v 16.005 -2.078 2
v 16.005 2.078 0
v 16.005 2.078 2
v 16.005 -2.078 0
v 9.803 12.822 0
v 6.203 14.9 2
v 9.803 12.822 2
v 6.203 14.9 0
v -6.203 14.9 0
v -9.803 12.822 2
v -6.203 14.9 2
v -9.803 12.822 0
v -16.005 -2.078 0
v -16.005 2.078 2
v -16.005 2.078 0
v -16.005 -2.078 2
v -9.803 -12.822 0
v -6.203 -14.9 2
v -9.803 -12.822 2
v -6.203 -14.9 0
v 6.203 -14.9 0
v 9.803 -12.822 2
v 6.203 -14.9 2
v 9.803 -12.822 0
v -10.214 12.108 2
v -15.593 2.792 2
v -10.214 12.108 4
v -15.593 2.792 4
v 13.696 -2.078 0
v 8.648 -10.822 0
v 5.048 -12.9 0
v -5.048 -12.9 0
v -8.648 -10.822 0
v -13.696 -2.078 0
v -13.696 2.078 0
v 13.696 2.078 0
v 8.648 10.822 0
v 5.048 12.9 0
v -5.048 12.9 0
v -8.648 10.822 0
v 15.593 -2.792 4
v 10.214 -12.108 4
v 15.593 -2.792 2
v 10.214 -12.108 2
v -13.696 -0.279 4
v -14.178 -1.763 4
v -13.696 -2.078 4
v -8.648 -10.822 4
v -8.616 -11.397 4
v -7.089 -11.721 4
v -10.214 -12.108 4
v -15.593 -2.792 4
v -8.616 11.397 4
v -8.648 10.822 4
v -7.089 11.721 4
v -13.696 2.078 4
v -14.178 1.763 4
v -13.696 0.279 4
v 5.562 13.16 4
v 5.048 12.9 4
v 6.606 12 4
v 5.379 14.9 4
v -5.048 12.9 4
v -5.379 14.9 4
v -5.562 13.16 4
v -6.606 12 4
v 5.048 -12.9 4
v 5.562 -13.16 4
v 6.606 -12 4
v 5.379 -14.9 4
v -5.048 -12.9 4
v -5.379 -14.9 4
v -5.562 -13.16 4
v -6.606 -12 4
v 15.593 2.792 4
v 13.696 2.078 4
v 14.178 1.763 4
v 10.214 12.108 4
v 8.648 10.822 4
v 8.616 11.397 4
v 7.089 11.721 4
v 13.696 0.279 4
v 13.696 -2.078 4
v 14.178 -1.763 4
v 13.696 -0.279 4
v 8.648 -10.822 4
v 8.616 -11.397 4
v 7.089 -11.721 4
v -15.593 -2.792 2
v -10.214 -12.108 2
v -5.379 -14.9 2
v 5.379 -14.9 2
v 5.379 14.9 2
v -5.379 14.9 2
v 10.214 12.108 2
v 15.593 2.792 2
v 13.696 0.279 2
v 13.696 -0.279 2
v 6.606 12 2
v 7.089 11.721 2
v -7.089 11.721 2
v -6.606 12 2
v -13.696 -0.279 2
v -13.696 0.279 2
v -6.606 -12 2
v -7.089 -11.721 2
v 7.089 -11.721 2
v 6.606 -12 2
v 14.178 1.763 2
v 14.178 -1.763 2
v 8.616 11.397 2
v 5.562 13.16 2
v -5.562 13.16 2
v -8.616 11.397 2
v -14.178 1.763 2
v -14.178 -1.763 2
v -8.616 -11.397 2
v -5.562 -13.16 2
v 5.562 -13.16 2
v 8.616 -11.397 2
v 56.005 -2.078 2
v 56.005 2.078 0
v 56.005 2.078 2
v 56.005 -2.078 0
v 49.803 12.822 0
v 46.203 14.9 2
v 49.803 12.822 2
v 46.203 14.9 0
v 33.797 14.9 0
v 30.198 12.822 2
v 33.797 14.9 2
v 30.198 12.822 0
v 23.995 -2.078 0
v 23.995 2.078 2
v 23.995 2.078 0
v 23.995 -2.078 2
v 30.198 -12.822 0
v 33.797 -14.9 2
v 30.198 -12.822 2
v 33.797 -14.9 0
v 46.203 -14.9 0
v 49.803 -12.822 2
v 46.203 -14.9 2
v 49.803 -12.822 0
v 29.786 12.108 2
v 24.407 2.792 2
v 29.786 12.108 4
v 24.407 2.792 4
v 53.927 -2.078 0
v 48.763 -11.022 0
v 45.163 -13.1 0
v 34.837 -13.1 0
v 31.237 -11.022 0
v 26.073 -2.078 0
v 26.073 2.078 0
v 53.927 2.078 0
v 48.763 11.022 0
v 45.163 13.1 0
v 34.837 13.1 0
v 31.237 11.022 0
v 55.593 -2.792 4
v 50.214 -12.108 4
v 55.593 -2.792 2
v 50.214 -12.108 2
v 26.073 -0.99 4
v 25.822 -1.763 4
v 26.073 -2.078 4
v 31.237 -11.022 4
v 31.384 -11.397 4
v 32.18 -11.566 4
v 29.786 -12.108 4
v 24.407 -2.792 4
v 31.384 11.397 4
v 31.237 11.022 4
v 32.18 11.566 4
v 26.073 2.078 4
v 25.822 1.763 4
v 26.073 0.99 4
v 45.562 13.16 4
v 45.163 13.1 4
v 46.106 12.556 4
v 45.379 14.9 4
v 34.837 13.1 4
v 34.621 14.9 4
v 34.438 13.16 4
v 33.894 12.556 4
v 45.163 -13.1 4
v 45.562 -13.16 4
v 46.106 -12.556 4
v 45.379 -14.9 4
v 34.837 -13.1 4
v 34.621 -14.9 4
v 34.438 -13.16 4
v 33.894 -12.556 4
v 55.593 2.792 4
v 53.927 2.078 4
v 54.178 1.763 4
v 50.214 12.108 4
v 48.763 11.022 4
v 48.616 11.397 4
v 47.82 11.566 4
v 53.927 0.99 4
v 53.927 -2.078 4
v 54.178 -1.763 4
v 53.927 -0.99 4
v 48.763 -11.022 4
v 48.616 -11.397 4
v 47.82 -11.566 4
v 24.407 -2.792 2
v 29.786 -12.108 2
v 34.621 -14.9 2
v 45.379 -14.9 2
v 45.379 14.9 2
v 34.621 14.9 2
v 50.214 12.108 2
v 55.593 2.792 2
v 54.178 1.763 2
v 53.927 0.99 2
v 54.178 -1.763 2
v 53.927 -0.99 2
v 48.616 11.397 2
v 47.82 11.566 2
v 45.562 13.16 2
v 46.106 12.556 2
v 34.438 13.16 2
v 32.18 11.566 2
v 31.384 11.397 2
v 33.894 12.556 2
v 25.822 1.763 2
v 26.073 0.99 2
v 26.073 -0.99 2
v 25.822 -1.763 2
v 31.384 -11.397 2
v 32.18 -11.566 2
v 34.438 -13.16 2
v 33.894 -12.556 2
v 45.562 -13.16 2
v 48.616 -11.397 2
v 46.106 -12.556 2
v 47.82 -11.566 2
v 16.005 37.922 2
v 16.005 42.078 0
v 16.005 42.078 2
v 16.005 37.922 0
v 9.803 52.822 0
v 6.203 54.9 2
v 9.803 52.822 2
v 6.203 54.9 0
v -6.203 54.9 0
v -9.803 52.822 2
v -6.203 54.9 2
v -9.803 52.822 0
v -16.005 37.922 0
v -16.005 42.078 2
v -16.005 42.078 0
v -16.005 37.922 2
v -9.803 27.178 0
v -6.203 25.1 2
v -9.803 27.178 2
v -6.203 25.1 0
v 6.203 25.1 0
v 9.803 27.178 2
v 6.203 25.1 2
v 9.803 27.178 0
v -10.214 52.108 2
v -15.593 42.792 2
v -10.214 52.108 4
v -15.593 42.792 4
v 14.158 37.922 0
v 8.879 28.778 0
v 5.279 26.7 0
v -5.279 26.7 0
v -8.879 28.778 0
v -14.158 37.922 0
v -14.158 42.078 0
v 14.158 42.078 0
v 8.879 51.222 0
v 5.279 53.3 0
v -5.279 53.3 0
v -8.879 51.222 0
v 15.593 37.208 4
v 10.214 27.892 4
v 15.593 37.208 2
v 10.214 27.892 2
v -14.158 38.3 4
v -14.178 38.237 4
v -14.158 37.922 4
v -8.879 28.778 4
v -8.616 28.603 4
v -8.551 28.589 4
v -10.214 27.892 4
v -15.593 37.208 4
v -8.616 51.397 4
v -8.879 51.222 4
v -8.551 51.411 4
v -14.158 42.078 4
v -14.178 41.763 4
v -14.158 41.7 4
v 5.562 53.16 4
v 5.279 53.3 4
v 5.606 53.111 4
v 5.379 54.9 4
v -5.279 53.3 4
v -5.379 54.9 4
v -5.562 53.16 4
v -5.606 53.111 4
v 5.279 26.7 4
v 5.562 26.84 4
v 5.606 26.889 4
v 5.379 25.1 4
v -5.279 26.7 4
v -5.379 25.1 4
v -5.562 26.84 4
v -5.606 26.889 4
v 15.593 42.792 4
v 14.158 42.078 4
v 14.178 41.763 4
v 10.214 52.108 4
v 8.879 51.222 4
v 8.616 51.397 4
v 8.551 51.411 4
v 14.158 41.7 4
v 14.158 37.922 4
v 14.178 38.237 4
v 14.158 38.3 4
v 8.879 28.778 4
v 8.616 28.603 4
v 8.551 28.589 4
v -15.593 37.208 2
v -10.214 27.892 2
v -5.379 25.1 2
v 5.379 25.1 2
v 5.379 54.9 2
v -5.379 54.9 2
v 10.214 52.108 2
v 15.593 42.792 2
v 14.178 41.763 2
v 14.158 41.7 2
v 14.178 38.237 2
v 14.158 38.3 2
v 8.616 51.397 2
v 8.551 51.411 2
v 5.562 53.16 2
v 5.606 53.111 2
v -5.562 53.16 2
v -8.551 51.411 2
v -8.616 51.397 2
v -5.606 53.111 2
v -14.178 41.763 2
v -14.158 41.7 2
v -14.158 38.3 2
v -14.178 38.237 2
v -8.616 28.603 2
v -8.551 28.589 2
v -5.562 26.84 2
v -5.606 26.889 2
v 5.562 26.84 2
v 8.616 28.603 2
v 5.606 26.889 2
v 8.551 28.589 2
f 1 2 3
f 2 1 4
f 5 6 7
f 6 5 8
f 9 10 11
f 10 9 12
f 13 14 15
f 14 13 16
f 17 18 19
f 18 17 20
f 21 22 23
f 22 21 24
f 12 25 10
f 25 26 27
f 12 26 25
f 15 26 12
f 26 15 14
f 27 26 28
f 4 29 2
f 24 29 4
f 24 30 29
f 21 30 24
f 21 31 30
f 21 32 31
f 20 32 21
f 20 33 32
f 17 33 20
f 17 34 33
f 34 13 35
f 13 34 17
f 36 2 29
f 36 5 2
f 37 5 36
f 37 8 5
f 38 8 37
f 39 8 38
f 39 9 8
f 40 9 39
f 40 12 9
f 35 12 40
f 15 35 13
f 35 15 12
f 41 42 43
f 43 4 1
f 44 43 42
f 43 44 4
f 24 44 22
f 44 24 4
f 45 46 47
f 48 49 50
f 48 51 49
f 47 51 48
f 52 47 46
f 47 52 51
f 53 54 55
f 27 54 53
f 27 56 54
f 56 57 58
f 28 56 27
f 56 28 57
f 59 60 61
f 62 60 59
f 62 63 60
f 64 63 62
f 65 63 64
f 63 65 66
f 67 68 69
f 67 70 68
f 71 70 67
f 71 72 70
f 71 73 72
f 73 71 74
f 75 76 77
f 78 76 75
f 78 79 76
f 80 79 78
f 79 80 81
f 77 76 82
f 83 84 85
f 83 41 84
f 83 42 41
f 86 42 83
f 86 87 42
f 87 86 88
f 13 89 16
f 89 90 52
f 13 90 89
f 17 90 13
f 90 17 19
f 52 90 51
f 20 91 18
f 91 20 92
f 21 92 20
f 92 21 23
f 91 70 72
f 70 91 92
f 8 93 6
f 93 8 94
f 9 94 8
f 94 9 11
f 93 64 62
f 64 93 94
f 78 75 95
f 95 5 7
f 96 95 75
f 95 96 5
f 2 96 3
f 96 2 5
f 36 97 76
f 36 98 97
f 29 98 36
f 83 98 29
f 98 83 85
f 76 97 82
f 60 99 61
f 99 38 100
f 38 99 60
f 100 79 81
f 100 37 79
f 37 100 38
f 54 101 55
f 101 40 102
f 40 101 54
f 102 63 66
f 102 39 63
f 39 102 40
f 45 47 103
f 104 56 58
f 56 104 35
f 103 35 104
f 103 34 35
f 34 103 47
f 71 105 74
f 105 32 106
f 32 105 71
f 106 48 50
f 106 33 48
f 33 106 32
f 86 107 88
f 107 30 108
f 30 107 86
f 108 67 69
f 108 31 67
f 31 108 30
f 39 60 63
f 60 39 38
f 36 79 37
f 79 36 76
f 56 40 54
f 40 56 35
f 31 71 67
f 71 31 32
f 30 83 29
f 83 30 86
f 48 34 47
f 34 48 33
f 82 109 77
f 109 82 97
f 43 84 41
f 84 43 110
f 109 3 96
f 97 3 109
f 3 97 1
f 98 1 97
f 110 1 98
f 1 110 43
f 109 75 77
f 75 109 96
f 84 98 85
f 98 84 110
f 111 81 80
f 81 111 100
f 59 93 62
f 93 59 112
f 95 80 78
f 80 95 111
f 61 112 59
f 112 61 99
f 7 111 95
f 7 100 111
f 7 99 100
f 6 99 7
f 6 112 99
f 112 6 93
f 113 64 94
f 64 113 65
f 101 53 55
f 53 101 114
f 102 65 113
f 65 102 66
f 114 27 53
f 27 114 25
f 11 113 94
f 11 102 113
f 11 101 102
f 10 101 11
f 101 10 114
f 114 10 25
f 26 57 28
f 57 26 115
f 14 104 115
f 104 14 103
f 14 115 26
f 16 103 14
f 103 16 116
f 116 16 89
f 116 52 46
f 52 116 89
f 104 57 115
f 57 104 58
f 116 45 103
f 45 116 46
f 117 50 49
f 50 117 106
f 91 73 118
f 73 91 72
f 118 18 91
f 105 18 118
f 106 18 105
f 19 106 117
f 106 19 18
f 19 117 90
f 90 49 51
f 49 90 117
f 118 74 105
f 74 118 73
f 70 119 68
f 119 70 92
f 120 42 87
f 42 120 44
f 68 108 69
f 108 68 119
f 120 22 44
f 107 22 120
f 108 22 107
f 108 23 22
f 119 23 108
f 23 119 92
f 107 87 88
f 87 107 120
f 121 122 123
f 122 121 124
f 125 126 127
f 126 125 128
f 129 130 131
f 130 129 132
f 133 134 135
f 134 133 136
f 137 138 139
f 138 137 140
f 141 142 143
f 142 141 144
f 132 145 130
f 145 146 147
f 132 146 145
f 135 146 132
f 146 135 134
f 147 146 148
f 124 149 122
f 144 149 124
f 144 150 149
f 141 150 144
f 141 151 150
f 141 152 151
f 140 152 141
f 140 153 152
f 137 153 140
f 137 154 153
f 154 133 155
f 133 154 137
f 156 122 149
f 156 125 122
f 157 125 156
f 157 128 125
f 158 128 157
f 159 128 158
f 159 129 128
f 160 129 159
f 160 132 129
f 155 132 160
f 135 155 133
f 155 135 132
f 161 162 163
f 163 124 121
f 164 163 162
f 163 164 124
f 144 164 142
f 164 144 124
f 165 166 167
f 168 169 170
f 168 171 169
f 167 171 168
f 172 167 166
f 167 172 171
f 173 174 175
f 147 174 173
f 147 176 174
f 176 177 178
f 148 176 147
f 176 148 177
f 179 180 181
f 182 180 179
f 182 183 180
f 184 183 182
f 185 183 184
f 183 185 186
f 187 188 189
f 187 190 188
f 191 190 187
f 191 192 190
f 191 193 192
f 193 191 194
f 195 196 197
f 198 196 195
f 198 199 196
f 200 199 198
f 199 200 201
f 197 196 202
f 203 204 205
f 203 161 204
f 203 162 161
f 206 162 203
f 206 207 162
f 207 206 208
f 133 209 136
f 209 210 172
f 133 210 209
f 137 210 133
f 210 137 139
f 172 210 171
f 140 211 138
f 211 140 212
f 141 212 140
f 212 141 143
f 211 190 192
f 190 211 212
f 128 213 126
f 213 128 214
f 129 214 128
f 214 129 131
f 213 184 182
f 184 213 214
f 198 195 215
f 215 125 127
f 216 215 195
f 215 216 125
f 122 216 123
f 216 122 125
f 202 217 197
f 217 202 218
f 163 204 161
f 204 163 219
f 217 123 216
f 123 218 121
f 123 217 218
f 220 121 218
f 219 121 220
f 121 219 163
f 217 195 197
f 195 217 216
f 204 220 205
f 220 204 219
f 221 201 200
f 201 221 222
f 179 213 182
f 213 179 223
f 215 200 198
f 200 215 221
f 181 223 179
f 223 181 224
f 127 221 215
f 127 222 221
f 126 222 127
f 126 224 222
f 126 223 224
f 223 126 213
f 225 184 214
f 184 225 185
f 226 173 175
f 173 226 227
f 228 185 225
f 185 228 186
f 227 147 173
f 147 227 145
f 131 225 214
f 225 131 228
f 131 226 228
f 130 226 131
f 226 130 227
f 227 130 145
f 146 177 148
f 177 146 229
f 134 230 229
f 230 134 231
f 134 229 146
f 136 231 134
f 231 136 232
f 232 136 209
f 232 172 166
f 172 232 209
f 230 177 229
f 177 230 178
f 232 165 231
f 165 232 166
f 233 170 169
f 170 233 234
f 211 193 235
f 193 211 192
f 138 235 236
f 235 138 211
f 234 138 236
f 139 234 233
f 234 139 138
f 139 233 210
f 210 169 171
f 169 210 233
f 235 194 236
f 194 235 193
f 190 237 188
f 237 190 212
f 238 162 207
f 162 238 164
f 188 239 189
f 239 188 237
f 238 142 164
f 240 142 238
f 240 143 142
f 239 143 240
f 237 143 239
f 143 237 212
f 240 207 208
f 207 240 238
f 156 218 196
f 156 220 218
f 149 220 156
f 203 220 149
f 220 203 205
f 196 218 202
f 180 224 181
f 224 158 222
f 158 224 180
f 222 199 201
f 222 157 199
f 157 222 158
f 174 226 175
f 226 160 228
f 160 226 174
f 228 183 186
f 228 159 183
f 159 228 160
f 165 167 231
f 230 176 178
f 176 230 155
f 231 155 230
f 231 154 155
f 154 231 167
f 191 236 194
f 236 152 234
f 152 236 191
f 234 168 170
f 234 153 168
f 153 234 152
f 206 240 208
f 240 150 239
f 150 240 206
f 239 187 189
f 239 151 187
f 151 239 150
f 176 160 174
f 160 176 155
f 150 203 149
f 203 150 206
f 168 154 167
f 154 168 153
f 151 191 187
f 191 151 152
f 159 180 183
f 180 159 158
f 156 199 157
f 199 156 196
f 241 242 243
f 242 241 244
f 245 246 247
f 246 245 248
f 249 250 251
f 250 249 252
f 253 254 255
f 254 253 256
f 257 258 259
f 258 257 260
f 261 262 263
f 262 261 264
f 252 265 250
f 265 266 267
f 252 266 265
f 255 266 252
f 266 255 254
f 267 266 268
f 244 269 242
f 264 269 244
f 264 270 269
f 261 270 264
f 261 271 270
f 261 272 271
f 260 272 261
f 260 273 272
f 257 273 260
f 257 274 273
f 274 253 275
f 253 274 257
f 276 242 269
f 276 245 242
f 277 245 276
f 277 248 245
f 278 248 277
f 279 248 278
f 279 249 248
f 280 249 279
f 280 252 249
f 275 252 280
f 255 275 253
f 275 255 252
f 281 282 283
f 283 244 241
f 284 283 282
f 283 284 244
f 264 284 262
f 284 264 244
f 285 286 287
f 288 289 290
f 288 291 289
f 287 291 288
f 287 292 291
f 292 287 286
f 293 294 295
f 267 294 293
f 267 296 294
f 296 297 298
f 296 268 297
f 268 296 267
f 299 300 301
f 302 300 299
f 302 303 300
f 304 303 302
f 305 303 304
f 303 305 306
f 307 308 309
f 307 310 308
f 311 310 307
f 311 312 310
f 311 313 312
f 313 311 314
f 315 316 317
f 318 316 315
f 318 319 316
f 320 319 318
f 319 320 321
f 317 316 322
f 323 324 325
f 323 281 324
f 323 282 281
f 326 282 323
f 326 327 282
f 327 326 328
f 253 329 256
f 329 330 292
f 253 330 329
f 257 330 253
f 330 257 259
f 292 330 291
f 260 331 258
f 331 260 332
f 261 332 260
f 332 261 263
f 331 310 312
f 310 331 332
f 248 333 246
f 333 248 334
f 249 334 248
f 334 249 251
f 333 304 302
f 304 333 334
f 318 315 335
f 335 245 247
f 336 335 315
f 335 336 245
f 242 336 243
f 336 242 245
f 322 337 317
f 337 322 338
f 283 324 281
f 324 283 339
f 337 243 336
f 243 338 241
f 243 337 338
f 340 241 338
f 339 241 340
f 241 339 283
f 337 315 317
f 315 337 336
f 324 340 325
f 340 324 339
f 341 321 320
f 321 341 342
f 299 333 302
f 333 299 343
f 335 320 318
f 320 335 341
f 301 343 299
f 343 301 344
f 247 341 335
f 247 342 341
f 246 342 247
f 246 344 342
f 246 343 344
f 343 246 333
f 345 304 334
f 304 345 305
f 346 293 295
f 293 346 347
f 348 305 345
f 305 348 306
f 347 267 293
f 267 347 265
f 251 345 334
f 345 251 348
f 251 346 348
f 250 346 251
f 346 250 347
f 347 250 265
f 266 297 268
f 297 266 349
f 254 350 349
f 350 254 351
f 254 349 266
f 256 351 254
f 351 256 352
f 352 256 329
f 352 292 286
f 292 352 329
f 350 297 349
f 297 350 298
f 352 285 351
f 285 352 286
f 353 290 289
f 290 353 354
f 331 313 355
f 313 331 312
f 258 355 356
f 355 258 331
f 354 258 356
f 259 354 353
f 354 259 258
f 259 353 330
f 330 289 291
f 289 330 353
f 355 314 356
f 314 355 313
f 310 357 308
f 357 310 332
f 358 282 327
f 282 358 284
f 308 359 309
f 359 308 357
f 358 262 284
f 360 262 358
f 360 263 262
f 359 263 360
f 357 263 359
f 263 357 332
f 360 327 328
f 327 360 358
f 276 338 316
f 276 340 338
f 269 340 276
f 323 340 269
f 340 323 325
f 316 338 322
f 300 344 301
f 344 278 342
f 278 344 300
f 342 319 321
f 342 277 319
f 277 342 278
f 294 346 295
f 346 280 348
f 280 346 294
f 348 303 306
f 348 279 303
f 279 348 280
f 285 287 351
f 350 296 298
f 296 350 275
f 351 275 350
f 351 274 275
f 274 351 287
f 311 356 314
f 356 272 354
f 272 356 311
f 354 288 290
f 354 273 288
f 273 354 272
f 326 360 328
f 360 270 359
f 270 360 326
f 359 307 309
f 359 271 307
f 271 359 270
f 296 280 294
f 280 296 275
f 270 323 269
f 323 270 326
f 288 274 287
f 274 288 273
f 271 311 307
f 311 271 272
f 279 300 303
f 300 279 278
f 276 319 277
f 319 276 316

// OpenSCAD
// file: marble_game.scad
/*
  Konstanten und Funktionen, die zu dem Murmelspiel gehören,
  also fix, bzw. durch die Geometrie des Spiels vorgegeben sind.
  Ist gedacht um über include <marble_game.scad> eingebunden zu werden.
*/

D_Kugel   = 12.8; // mm
D_Rinne   = 13.8; // mm
h_Rinne   = 5.9;  // Rinnentiefe in mm

//s_Hexagon = 2 * sqrt(60^2 - 30^2);// = 103.92 Hexagon vertikale Wiederholung
h_Hexagon_innen  = 29.8; // Schlüsselweite
r_Hexagon_innen = h_Hexagon_innen/2 * 2 / sqrt(3); // Umkreisradius

h_Hexagon_aussen = 59.7;
r_Hexagon_aussen = h_Hexagon_aussen/2 * 2 / sqrt(3); // Umkreisradius

module hexagon (h = 10, s = 59.7)
{
  r = s / 2 / cos (30);
  linear_extrude (height = h)
    polygon ([
      for (phi = [0:60:360])
         [r*cos(phi), r*sin(phi)]]);
}

module beveled_hexagon (h = 10, s = 59.7, b = 3)
{
  difference ()
  {
    r = s / 2 / cos (30);
    hexagon (h = h, s = s);
    for (k = [0:5])
    rotate ([0, 0, k * 60])
     translate ([r-b, -s/4, -s/8])
       cube (s/2);
  }
}

module rail_stamp(rinne_offset = 0.01, y_cyl_offset = 2.0)
{
// Design so, dass 0,0,0 die Mitte der Rinne,
// Außenkante Sechseck, Oberfläche ist.
// Mit rinne_offset kann der Zylinder für die Rinne
// über das Minimum hinaus verlängert werden

noff = 1;  // auch ein Offset, allerdings wird der nach hinten freigeschnitten (für moderate Neigungen)

// Die zwei Ausbuchtungen recht und links
D_bogen  = 3.6;   // Oberer Bogen
s_rand   = 1.2;   // Abstand zur Außenkante
h_tasche = 5.1;   // Höhe der Tasche
t_tasche = 9.1;   // Tiefe der Tasche zur Oberfläche
t_rand   = 7.3;   // Tiefe des Absatzes (der s_rand breite Steg) 
x_tasche = 6.5/2; // Abstand Tasche linke Seite zur Symmetrielinie

for (k = [-1:2:1])
{
  translate([k* (x_tasche + D_bogen/2), h_tasche + s_rand, -t_tasche])
    cylinder (t_tasche, d = D_bogen);

  cube_x = k * x_tasche - ((k < 0)? D_bogen : 0);
  translate([cube_x, s_rand, -t_tasche])
    cube([D_bogen, h_tasche, t_tasche]);

  translate([cube_x, +0.01 - noff, -t_rand])
    cube ([D_bogen, s_rand + noff, t_rand]);
}
translate ([0, -noff, D_Rinne/2 - h_Rinne]) // Oberfläche bei z = 0
  rotate ([-90, 0, 0])
    {
      hull ()
      {  
          cylinder (h = 10 + rinne_offset + noff, d = D_Rinne);
          translate ([0, -y_cyl_offset, 0])
            cylinder (h = 10 + rinne_offset + noff, d = D_Rinne);
      }
    }
}

module demo_rail_stamp ()
{
    difference ()
    {
      hexagon (h = 10, s = 60);

    translate ([0, 0, 1.6])
      hexagon (h = 10, s = 40); // grob innen

    for (k = [0:2])
      rotate ([0, 0, 120 * k])
        translate ([0, -30, 10])
          rail_stamp (rinne_offset = 40);
    }    
}

module base_adapter (t = 1.0)
{
    // Adapter zur Grundplatte, 2mm stark
    difference ()
    {
      beveled_hexagon(h = 4, s = h_Hexagon_innen, b = 1.2);
      translate ([0, 0, -0.01])
        beveled_hexagon(h = 4.02, s = h_Hexagon_innen - 2*t, b = 1.2);
      for (k = [0:5])
        rotate ([0, 0, 60 * k])
          translate ([r_Hexagon_innen - 0.6, 0, 2])
            cylinder (d = 6, h = 5);
    }
}

module base_adapter_inv (t = 1.3)
{
  translate ([0, 0, -0.01])
    difference ()
    {
      hexagon(h = 2, s = h_Hexagon_innen + 0.1);
      translate ([0, 0, -0.01])
        hexagon(h = 2.02, s = h_Hexagon_innen - 2*t);
    }
}
// main file
include <marble_game.scad>

base_adapter (t = 2.0);
translate ([40, 0, 0])
  base_adapter (t = 1.8);
translate ([0, 40, 0])
  base_adapter (t = 1.6);
